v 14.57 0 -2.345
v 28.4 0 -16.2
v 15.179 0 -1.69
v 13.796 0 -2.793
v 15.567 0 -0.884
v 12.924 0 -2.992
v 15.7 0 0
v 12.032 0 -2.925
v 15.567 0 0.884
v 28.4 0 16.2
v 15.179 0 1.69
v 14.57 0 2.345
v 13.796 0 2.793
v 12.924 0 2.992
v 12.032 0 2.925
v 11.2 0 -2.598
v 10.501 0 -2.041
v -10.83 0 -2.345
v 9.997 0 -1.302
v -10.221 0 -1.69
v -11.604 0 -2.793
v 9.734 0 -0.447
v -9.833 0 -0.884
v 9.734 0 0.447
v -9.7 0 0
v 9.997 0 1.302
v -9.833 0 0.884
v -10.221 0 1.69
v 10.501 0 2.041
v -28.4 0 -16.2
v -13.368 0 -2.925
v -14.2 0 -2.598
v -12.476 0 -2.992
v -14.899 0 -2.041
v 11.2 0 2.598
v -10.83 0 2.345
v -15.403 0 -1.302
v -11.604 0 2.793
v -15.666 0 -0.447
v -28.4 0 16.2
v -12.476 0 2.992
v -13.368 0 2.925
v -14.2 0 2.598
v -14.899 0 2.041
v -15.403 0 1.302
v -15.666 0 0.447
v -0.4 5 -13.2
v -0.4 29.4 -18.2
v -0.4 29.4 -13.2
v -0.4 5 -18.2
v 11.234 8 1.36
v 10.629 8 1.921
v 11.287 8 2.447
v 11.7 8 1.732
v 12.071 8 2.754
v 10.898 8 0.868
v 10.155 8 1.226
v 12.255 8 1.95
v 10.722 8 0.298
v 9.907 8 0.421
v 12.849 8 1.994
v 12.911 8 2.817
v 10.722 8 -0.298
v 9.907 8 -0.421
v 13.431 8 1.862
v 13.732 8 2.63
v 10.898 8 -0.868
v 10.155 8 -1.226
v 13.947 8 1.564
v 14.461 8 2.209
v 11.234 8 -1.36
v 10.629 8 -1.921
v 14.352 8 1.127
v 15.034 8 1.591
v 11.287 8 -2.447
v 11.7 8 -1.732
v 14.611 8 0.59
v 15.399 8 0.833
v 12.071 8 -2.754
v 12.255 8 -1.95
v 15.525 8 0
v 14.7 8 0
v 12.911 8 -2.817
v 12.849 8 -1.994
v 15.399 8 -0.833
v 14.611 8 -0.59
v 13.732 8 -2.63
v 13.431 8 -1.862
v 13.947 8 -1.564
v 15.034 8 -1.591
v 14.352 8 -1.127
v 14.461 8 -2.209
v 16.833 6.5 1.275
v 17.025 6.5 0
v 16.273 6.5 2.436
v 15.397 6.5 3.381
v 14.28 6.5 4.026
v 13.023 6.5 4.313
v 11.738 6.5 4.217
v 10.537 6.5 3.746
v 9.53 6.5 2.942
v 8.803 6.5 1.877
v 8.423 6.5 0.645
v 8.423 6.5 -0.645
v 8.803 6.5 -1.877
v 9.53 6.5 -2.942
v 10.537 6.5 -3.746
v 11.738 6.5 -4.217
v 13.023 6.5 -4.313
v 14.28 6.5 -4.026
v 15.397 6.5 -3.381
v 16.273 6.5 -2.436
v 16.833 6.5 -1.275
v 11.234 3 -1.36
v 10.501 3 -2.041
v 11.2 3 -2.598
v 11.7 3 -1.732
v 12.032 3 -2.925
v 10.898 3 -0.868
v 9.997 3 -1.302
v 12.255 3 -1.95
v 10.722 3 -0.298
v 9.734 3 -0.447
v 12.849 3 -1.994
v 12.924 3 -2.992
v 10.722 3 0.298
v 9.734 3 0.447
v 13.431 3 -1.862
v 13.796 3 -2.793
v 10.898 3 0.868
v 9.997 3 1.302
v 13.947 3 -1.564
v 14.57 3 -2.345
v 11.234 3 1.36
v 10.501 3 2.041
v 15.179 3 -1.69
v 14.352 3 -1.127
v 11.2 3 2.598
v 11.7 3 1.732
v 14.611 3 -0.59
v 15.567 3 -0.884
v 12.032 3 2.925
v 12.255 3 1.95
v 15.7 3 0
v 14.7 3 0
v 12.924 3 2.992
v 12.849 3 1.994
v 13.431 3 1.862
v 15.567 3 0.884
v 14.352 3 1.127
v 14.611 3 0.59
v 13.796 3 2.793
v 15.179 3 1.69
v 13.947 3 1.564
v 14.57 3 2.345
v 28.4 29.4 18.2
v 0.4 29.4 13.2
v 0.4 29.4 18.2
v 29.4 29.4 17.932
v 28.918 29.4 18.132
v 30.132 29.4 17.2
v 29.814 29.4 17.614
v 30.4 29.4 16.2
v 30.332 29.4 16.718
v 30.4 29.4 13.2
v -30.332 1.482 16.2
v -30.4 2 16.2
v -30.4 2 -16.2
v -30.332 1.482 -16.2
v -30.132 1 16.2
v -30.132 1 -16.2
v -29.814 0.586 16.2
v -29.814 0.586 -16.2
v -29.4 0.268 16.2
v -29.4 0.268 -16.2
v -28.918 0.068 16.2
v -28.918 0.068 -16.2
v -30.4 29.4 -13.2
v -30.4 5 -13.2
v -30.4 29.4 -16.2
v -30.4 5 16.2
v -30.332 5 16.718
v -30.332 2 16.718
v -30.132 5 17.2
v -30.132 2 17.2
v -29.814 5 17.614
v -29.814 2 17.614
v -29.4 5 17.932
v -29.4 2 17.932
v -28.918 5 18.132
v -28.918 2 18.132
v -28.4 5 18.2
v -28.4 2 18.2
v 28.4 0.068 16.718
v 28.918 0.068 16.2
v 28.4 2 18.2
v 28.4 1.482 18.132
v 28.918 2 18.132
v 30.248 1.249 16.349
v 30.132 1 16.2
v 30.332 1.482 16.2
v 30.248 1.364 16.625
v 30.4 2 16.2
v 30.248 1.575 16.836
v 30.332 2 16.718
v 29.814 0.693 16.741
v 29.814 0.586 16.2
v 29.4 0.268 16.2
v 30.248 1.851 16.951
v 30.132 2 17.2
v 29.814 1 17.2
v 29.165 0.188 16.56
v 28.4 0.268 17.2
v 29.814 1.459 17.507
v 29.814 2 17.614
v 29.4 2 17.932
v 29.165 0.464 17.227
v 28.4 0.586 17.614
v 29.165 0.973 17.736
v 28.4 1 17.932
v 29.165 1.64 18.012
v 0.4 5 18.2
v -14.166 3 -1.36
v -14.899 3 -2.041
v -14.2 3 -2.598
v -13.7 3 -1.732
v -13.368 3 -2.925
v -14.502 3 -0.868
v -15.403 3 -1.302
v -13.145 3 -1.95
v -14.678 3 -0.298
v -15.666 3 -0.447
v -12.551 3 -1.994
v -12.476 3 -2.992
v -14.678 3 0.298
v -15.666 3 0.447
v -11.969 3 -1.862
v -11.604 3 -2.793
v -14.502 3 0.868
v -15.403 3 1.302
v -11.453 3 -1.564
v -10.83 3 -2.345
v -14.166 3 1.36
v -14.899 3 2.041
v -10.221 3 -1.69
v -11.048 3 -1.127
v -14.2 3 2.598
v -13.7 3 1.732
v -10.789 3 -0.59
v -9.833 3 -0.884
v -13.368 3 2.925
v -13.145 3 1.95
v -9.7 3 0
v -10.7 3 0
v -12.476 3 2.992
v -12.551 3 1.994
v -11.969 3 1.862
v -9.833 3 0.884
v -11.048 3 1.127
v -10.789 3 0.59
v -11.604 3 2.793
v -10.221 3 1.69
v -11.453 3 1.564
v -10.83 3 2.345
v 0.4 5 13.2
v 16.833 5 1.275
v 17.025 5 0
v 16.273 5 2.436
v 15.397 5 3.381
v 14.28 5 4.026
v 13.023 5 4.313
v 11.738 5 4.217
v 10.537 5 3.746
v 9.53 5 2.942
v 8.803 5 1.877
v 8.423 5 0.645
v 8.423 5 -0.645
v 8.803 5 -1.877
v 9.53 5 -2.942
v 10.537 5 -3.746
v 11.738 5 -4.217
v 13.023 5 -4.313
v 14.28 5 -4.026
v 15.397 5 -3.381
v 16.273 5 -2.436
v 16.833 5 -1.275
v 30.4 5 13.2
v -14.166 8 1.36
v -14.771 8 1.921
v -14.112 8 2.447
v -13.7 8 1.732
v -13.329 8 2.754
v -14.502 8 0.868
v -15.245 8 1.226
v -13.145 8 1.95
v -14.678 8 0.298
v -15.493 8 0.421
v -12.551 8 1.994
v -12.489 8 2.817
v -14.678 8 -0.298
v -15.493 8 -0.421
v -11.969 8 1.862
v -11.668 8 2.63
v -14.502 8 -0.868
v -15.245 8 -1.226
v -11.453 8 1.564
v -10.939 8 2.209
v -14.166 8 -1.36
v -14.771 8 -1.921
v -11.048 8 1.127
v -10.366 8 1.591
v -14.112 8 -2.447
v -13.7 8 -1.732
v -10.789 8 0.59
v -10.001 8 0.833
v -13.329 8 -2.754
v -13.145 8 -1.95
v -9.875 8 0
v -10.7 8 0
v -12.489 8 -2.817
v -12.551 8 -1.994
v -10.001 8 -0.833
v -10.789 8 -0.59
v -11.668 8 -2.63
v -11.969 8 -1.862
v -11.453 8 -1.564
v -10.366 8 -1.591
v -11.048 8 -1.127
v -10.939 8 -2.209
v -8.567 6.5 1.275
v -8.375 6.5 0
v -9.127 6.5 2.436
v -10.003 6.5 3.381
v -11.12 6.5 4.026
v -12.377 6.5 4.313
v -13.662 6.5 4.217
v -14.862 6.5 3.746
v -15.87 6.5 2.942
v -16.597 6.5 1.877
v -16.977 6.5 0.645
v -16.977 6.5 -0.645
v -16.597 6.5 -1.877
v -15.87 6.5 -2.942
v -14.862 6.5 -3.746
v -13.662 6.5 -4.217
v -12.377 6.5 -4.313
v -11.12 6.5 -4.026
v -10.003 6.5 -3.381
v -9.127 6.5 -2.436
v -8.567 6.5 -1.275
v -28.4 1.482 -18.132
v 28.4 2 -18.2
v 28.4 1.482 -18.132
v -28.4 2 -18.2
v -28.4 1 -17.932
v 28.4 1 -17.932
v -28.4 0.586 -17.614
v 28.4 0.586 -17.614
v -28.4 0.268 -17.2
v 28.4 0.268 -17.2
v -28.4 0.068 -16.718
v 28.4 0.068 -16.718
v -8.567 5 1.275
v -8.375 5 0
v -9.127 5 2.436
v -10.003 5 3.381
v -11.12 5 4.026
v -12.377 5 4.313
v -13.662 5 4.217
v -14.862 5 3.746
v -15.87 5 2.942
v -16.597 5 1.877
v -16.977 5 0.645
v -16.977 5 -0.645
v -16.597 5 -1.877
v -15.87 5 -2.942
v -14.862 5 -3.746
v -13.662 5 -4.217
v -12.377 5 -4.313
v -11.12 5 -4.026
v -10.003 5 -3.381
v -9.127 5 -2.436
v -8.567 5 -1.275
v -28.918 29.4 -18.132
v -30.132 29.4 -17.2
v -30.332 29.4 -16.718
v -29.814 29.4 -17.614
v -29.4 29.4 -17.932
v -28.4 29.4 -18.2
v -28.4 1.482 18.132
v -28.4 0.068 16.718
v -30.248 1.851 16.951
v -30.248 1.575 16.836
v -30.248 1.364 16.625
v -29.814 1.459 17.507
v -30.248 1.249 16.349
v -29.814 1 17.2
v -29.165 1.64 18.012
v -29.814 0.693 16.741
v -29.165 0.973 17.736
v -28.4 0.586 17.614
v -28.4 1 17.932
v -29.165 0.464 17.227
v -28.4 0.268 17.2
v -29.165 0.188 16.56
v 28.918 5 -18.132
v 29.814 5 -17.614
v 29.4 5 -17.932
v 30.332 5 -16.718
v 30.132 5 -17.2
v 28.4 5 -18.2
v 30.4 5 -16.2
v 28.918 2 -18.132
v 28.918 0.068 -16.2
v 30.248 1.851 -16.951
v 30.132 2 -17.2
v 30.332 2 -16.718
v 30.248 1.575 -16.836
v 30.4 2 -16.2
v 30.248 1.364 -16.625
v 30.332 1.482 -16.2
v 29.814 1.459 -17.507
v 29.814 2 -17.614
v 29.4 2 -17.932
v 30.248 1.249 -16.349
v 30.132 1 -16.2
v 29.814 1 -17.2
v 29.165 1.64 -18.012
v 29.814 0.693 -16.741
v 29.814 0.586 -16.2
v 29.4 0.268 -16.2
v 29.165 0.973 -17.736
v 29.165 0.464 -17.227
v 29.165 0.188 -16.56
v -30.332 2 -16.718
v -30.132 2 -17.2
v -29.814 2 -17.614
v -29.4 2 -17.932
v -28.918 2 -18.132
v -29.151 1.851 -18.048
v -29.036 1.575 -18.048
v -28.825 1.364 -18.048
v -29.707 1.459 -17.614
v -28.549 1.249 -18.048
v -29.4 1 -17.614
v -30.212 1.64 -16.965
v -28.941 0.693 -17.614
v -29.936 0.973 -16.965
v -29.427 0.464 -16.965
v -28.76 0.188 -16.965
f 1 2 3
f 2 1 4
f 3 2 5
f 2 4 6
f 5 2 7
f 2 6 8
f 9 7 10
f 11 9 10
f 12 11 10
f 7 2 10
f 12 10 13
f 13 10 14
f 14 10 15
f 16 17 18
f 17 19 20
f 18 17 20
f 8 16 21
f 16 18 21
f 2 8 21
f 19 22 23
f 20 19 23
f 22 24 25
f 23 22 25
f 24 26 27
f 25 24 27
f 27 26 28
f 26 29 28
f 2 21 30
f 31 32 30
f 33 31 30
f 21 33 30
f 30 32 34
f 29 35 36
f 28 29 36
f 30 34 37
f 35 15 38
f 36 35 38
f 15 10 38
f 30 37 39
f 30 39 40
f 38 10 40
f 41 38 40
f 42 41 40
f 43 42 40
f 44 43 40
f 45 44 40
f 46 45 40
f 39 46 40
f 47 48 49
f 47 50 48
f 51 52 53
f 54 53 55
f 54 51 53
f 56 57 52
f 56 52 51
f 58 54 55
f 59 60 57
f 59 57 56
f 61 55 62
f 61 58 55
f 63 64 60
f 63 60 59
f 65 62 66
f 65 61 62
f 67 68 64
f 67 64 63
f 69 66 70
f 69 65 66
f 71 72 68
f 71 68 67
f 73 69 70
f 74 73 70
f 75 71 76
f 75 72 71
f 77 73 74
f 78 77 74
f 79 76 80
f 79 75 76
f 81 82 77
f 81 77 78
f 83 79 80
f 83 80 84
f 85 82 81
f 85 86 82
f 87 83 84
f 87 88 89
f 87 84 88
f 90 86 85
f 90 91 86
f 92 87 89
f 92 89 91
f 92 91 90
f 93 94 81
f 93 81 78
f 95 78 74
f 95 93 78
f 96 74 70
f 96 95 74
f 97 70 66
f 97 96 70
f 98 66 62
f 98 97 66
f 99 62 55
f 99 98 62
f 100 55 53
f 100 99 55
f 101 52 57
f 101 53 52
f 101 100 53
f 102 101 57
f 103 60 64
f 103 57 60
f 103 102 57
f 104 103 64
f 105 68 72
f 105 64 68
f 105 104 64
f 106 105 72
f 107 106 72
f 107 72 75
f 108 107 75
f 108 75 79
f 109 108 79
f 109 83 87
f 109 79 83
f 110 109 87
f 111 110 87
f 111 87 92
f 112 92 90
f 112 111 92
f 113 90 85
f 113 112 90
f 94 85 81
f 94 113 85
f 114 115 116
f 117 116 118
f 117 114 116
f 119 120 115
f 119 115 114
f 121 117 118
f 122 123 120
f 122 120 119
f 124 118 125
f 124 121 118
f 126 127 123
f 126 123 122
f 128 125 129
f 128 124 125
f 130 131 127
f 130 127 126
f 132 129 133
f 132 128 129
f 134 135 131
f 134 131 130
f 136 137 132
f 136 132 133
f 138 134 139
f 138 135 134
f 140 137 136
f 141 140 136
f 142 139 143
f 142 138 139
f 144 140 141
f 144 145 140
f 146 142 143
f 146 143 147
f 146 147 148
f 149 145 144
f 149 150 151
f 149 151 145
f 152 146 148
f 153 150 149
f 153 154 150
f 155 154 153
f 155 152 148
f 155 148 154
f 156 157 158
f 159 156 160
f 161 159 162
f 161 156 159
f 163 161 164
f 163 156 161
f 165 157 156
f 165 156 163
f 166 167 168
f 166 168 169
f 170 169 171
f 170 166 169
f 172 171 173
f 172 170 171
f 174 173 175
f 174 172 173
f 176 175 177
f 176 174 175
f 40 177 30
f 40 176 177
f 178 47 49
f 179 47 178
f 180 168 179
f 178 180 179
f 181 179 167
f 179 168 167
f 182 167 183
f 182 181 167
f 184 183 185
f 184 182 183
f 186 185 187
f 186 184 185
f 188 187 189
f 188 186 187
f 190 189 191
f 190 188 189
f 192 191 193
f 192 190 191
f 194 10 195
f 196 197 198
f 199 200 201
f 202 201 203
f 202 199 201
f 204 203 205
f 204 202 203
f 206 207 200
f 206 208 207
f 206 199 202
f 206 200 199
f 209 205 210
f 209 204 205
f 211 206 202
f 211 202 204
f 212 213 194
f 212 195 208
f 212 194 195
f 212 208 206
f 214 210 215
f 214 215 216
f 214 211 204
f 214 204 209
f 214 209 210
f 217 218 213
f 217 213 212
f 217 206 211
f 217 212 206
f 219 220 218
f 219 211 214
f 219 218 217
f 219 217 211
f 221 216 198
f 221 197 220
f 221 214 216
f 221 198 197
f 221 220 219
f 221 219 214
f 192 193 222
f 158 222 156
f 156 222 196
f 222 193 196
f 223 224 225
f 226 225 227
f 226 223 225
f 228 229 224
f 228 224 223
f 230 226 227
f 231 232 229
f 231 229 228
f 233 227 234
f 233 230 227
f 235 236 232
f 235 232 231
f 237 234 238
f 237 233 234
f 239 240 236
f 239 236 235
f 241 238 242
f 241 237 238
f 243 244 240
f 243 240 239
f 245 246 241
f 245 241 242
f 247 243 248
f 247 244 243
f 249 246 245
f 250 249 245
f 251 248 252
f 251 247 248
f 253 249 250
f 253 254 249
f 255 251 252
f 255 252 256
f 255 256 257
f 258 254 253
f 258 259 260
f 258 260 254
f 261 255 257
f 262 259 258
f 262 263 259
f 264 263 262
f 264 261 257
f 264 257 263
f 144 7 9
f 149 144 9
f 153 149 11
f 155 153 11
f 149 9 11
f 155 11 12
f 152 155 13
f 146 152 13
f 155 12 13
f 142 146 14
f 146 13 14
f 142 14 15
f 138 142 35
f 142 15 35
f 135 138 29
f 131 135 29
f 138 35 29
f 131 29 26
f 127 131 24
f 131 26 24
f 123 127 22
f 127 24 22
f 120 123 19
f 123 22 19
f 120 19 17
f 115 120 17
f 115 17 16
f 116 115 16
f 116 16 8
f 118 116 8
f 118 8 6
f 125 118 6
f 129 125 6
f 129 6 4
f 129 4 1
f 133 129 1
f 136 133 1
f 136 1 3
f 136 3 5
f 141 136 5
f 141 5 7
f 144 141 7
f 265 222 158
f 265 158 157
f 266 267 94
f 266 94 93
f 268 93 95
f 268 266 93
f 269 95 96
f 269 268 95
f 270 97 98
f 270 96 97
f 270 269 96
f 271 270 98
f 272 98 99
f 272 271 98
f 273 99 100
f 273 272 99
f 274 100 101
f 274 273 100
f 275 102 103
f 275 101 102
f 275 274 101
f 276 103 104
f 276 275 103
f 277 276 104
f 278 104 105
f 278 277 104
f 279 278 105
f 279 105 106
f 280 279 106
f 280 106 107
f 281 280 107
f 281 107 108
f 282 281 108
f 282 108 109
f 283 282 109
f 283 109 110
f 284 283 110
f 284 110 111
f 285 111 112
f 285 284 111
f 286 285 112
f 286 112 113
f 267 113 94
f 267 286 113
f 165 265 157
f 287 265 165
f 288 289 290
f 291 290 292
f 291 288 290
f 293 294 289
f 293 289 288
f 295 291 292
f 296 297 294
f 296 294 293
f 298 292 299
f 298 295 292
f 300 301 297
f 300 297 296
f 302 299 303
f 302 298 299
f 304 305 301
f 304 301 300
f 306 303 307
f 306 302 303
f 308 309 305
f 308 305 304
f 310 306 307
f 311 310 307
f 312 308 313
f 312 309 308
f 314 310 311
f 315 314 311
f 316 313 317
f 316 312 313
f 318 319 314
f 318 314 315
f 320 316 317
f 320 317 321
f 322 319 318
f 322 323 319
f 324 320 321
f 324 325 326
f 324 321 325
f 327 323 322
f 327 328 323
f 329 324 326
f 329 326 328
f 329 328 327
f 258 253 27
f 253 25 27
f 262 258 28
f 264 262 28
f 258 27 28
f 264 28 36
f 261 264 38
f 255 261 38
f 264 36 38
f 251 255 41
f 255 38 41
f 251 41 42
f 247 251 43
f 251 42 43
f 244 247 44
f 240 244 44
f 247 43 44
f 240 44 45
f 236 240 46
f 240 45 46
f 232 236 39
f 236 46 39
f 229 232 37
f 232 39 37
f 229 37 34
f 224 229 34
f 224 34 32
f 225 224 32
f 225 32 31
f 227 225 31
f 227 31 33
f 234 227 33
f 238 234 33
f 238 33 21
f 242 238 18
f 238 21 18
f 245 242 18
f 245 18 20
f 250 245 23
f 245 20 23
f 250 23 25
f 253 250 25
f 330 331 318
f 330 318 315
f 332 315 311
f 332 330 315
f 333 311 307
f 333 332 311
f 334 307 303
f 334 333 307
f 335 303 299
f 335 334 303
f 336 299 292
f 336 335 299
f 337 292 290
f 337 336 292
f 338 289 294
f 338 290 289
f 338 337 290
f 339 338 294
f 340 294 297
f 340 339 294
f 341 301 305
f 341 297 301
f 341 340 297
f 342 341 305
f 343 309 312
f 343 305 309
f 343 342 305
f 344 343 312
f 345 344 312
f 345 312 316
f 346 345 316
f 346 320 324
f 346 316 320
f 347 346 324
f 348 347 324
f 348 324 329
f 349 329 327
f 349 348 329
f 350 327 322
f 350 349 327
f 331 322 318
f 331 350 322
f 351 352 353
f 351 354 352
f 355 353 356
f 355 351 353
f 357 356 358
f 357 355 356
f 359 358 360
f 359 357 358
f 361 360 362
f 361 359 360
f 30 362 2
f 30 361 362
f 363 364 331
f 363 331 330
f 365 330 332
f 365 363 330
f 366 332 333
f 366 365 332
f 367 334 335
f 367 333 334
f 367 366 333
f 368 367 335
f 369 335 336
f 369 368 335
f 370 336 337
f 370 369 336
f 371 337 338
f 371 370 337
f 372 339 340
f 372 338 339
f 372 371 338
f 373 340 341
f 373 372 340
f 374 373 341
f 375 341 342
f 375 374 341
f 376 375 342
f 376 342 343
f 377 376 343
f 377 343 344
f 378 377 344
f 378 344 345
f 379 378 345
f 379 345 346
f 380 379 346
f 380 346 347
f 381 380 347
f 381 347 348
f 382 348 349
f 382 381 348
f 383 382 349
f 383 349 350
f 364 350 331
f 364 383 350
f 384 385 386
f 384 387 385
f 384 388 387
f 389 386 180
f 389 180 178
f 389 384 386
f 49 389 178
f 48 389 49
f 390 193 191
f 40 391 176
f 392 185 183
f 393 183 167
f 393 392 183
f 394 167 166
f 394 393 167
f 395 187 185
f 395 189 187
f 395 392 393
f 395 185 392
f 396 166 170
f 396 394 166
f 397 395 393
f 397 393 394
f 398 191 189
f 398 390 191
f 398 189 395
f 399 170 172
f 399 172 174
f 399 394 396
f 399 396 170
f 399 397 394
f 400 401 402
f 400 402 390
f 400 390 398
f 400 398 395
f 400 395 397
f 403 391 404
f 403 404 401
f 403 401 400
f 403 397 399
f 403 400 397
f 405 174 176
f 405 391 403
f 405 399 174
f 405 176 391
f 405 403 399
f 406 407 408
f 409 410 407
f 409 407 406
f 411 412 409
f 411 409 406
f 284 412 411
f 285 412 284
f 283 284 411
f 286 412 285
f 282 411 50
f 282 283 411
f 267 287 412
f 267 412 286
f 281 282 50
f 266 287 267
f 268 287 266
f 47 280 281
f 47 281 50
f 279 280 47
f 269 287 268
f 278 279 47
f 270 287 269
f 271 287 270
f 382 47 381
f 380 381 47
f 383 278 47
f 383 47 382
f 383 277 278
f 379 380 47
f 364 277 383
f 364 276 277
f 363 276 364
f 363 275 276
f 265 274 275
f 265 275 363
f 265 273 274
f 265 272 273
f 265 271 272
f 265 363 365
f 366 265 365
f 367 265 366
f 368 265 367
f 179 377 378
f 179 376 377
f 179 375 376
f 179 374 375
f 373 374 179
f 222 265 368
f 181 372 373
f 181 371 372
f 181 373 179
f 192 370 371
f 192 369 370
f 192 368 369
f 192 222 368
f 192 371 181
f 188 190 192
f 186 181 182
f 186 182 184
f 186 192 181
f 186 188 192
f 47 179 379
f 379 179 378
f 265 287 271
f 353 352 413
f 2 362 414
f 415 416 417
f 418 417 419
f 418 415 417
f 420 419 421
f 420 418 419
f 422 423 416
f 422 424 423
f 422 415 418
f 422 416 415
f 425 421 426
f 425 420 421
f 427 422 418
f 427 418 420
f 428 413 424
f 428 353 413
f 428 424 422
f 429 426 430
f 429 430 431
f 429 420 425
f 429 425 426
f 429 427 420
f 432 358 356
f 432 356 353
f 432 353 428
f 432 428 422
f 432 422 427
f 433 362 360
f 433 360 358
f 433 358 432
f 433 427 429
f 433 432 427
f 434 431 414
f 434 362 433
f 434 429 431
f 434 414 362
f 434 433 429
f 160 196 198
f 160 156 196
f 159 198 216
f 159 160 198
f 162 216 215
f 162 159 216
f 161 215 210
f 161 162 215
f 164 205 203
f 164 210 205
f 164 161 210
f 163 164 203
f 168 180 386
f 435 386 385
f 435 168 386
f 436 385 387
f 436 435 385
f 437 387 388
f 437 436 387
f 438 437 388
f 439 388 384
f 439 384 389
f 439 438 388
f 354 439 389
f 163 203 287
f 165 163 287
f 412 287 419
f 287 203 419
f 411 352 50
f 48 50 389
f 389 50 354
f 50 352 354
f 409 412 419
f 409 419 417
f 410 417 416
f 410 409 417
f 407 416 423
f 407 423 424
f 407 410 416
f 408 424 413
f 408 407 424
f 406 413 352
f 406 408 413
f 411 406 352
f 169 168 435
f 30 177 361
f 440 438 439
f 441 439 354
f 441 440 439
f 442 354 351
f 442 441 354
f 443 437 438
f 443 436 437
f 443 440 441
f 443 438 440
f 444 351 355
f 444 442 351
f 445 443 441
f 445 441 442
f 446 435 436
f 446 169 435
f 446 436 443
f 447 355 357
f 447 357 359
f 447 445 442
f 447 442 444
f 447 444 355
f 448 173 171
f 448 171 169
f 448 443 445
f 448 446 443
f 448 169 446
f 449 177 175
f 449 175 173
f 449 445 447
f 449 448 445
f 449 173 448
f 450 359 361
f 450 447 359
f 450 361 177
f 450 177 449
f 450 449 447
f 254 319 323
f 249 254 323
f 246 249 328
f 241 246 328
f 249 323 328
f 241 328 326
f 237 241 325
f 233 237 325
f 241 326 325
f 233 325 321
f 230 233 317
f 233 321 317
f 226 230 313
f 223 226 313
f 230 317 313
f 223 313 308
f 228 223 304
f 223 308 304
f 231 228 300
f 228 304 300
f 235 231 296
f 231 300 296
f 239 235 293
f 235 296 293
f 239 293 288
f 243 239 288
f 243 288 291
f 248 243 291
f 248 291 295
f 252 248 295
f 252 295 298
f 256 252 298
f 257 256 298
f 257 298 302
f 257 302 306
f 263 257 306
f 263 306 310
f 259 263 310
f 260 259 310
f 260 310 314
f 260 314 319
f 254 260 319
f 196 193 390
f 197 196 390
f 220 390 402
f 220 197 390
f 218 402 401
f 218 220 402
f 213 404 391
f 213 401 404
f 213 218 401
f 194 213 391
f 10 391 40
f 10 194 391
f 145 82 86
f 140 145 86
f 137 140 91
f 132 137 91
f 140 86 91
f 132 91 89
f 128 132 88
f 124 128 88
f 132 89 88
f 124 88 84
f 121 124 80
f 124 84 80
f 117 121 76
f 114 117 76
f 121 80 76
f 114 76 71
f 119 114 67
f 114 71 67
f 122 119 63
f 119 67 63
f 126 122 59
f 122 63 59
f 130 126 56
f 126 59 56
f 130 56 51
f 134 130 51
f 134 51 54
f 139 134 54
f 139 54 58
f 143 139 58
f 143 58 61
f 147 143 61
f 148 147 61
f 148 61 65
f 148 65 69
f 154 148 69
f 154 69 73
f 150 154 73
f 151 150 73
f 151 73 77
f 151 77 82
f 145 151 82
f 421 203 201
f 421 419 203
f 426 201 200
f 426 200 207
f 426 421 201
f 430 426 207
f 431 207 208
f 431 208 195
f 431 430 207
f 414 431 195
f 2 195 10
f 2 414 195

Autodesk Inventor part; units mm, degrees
ref_plane "YZ Plane" through (0, 0, 0) normal (1, 0, 0) x (0, 1, 0)
ref_plane "XZ Plane" through (0, 0, 0) normal (0, 1, 0) x (-1, 0, 0)
ref_plane "XY Plane" through (0, 0, 0) normal (0, 0, 1) x (1, 0, 0)
sketch "Sketch1" plane through (0, 0, 0) normal (0, 1, 0) x (-1, 0, 0)
  line L0 (30.4, 18.2) -> (-30.4, 18.2)
  line L1 (-30.4, 18.2) -> (-30.4, -18.2)
  line L2 (-30.4, -18.2) -> (30.4, -18.2)
  line L3 (30.4, -18.2) -> (30.4, 18.2)
  point P0 (0, 0)
  dimension "d0" = 60.8
  dimension "d1" = 36.4
extrude "Extrusion1" add sketch "Sketch1" along normal blind 5
sketch "Sketch2" plane through (0, 5, 0) normal (0, 1, 0) x (1, 0, 0)
  line L0 (30.4, 18.2) -> (-30.4, 18.2) projected
  line L1 (-30.4, 18.2) -> (-0.4, 18.2)
  line L2 (-0.4, 18.2) -> (-0.4, 13.2)
  line L3 (-0.4, 13.2) -> (-30.4, 13.2)
  line L4 (-30.4, 13.2) -> (-30.4, 18.2)
  line L5 (30.4, -18.2) -> (30.4, 18.2) projected
  line L6 (30.4, -18.2) -> (0.4, -18.2)
  line L7 (0.4, -18.2) -> (0.4, -13.2)
  line L8 (0.4, -13.2) -> (30.4, -13.2)
  line L9 (30.4, -13.2) -> (30.4, -18.2)
  point P0 (0, 0)
  dimension "d4" = 30
  dimension "d5" = 5
  dimension "d6" = 30
  dimension "d7" = 5
extrude "Extrusion2" add sketch "Sketch2" along normal blind 24.4
sketch "Sketch3" plane through (0, 5, 0) normal (0, 1, 0) x (1, 0, 0)
  circle A0 centre (12.7, 0) radius 4.325
  circle A1 centre (-12.7, 0) radius 4.325
  point P0 (0, 0)
  dimension "d10" = 8.65
  dimension "d11" = 8.65
extrude "Extrusion3" add sketch "Sketch3" along normal blind 3
sketch "Sketch4" plane through (-12.7, 8, 0) normal (0, 1, 0) x (1, 0, 0)
  circle A0 centre (0, 0) radius 2
  circle A1 centre (25.4, 0) radius 4.325 projected
  circle A2 centre (25.4, 0) radius 2
  point P0 (12.7, 0)
  dimension "d14" = 4
  dimension "d15" = 4
extrude "Extrusion4" cut sketch "Sketch4" against normal blind 15 contours A0 | A2
sketch "Sketch5" plane through (0, 0, 0) normal (0, -1, 0) x (1, 0, 0)
  circle A0 centre (12.7, 0) radius 2 projected
  circle A1 centre (12.7, 0) radius 3
  circle A2 centre (-12.7, 0) radius 2 projected
  circle A3 centre (-12.7, 0) radius 3
  point P0 (0, 0)
  dimension "d18" = 6
  dimension "d19" = 6
extrude "Extrusion5" cut sketch "Sketch5" against normal blind 3 contours A0 | A1 | A2 | A3
chamfer "Chamfer1" distance 1.5 angle 45 2 edges at (8.375, 8, 0) (-17.025, 8, 0)
fillet "Fillet1" radius 2 8 edges at (0, 0, 18.2) (-30.4, 0, 0) (0, 0, -18.2) (30.4, 0, 0) (-30.4, 14.7, -18.2) (-30.4, 2.5, 18.2) (30.4, 14.7, 18.2) (30.4, 2.5, -18.2)
properties part number "2Wide5mm"
